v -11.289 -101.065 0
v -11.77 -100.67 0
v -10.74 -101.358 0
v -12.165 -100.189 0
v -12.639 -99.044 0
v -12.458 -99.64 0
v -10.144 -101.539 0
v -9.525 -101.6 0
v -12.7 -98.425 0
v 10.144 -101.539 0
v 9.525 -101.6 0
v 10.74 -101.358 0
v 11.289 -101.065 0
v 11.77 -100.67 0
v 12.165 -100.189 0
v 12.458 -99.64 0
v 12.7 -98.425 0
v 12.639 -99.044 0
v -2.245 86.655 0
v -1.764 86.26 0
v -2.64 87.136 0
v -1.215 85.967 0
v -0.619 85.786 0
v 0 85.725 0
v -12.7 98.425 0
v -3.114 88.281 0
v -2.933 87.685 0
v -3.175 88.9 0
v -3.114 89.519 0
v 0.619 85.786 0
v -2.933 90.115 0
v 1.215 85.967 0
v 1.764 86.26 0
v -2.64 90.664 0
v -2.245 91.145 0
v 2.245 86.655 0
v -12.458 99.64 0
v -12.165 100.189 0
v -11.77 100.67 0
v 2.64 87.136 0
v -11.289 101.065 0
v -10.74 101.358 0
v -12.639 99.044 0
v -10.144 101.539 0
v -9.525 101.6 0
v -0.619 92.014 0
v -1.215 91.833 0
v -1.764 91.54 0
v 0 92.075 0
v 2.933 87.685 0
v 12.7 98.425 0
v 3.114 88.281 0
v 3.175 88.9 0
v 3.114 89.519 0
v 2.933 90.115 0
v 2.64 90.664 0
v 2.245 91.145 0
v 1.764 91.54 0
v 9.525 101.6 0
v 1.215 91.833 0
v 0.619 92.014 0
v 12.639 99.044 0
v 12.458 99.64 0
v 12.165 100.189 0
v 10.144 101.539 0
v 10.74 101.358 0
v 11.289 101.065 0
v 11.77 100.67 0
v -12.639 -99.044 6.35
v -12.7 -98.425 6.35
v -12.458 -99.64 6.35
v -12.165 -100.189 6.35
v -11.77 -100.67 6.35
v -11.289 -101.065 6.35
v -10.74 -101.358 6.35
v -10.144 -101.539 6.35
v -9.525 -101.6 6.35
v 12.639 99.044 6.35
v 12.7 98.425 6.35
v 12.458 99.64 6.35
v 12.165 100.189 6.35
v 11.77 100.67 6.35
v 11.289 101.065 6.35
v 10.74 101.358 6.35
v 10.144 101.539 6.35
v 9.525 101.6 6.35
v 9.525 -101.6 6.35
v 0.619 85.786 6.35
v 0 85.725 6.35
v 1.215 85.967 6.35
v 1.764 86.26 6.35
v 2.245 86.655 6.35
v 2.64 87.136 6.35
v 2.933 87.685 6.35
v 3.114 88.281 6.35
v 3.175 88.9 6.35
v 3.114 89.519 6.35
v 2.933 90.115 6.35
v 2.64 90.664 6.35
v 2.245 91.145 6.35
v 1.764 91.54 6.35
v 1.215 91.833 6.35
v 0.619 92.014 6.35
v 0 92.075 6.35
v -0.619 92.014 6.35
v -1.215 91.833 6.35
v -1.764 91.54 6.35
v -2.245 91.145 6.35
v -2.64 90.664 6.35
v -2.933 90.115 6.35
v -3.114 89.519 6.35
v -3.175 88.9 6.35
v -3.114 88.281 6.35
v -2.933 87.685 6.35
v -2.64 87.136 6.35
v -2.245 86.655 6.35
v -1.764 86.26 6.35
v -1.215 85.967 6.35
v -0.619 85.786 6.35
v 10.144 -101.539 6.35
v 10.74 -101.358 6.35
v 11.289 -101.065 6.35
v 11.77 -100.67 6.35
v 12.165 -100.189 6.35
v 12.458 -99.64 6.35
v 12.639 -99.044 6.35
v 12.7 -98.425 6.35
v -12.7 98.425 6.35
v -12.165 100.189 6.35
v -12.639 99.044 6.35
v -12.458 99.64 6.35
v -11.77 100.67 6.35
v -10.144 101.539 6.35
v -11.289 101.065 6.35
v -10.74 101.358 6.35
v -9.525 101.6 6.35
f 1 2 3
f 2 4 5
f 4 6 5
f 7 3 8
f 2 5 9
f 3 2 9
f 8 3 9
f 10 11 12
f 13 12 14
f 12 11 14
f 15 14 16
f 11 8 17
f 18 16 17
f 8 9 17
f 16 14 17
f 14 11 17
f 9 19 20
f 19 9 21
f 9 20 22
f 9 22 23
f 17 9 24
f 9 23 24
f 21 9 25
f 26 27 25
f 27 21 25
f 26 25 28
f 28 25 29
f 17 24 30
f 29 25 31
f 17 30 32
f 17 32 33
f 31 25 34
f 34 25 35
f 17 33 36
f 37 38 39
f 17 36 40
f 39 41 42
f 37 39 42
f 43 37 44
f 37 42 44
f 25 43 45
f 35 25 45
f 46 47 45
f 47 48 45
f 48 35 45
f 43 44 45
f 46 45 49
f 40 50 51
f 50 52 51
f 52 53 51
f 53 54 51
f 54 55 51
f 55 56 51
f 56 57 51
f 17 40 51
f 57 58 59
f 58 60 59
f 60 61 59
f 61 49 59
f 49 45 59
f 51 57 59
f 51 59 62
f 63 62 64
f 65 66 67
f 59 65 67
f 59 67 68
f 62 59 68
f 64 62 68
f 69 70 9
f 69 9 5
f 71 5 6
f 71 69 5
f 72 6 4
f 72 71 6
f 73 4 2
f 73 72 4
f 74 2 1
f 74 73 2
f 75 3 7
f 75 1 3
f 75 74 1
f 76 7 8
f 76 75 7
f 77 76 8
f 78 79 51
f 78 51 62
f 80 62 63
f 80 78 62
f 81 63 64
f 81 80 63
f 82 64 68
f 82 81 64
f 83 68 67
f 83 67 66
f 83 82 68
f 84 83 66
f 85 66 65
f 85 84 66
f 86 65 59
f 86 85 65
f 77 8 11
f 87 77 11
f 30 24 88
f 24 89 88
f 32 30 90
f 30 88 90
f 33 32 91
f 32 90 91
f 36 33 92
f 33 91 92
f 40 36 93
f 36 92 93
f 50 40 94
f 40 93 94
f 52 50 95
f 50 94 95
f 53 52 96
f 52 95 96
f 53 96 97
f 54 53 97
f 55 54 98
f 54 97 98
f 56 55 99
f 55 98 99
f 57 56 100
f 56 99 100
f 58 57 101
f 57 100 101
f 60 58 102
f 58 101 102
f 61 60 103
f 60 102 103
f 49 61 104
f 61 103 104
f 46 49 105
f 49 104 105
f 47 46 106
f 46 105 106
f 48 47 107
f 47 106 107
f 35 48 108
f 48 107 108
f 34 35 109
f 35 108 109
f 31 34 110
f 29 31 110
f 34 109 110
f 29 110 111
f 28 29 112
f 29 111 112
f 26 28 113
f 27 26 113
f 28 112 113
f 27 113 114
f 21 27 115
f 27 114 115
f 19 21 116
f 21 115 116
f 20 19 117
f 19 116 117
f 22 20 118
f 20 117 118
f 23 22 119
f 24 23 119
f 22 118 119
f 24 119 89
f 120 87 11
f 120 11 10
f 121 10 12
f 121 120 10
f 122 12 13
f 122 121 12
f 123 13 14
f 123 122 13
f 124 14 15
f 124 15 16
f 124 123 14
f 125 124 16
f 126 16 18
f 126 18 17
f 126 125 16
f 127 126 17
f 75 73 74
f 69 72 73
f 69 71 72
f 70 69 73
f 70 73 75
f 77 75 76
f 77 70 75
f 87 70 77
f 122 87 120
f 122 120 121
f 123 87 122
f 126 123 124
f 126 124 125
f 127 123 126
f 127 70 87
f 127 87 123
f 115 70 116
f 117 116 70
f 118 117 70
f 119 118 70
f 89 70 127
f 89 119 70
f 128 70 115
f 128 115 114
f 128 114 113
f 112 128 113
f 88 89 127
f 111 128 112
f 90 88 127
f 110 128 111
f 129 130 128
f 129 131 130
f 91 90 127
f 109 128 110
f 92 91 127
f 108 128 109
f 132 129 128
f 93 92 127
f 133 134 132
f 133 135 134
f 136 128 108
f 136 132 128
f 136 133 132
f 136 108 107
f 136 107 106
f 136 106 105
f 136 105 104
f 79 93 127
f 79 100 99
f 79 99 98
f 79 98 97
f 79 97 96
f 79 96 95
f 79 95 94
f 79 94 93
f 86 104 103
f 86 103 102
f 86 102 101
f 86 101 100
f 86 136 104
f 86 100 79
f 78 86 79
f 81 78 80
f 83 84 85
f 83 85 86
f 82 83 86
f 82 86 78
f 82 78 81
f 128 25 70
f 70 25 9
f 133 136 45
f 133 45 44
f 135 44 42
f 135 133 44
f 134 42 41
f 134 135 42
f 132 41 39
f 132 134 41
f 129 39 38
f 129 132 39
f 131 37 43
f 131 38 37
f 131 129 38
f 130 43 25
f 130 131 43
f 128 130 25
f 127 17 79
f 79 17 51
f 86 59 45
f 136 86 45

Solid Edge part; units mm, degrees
sketch "Sketch1" plane through (0, 0, 0) normal (0, 0, 1) x (1, 0, 0)
  line L0 (-12.7, -101.6) -> (12.7, -101.6)
  line L1 (12.7, -101.6) -> (12.7, 101.6)
  line L2 (12.7, 101.6) -> (-12.7, 101.6)
  line L3 (-12.7, 101.6) -> (-12.7, -101.6)
  dimension "D1" = 203.2
  dimension "D2" = 25.4
extrude "Protrusion1" add sketch "Sketch1" along normal blind 6.35
hole "Hole_1" at (0, 88.9, 6.35) direction (0, 0, -1) diameter 6.35 end up to next
fillet "Round_1" radius 3.175 4 edges at (12.7, 101.6, 3.175) (-12.7, 101.6, 3.175) (12.7, -101.6, 3.175) (-12.7, -101.6, 3.175)
properties part number "SPaRC 02 - 004"
